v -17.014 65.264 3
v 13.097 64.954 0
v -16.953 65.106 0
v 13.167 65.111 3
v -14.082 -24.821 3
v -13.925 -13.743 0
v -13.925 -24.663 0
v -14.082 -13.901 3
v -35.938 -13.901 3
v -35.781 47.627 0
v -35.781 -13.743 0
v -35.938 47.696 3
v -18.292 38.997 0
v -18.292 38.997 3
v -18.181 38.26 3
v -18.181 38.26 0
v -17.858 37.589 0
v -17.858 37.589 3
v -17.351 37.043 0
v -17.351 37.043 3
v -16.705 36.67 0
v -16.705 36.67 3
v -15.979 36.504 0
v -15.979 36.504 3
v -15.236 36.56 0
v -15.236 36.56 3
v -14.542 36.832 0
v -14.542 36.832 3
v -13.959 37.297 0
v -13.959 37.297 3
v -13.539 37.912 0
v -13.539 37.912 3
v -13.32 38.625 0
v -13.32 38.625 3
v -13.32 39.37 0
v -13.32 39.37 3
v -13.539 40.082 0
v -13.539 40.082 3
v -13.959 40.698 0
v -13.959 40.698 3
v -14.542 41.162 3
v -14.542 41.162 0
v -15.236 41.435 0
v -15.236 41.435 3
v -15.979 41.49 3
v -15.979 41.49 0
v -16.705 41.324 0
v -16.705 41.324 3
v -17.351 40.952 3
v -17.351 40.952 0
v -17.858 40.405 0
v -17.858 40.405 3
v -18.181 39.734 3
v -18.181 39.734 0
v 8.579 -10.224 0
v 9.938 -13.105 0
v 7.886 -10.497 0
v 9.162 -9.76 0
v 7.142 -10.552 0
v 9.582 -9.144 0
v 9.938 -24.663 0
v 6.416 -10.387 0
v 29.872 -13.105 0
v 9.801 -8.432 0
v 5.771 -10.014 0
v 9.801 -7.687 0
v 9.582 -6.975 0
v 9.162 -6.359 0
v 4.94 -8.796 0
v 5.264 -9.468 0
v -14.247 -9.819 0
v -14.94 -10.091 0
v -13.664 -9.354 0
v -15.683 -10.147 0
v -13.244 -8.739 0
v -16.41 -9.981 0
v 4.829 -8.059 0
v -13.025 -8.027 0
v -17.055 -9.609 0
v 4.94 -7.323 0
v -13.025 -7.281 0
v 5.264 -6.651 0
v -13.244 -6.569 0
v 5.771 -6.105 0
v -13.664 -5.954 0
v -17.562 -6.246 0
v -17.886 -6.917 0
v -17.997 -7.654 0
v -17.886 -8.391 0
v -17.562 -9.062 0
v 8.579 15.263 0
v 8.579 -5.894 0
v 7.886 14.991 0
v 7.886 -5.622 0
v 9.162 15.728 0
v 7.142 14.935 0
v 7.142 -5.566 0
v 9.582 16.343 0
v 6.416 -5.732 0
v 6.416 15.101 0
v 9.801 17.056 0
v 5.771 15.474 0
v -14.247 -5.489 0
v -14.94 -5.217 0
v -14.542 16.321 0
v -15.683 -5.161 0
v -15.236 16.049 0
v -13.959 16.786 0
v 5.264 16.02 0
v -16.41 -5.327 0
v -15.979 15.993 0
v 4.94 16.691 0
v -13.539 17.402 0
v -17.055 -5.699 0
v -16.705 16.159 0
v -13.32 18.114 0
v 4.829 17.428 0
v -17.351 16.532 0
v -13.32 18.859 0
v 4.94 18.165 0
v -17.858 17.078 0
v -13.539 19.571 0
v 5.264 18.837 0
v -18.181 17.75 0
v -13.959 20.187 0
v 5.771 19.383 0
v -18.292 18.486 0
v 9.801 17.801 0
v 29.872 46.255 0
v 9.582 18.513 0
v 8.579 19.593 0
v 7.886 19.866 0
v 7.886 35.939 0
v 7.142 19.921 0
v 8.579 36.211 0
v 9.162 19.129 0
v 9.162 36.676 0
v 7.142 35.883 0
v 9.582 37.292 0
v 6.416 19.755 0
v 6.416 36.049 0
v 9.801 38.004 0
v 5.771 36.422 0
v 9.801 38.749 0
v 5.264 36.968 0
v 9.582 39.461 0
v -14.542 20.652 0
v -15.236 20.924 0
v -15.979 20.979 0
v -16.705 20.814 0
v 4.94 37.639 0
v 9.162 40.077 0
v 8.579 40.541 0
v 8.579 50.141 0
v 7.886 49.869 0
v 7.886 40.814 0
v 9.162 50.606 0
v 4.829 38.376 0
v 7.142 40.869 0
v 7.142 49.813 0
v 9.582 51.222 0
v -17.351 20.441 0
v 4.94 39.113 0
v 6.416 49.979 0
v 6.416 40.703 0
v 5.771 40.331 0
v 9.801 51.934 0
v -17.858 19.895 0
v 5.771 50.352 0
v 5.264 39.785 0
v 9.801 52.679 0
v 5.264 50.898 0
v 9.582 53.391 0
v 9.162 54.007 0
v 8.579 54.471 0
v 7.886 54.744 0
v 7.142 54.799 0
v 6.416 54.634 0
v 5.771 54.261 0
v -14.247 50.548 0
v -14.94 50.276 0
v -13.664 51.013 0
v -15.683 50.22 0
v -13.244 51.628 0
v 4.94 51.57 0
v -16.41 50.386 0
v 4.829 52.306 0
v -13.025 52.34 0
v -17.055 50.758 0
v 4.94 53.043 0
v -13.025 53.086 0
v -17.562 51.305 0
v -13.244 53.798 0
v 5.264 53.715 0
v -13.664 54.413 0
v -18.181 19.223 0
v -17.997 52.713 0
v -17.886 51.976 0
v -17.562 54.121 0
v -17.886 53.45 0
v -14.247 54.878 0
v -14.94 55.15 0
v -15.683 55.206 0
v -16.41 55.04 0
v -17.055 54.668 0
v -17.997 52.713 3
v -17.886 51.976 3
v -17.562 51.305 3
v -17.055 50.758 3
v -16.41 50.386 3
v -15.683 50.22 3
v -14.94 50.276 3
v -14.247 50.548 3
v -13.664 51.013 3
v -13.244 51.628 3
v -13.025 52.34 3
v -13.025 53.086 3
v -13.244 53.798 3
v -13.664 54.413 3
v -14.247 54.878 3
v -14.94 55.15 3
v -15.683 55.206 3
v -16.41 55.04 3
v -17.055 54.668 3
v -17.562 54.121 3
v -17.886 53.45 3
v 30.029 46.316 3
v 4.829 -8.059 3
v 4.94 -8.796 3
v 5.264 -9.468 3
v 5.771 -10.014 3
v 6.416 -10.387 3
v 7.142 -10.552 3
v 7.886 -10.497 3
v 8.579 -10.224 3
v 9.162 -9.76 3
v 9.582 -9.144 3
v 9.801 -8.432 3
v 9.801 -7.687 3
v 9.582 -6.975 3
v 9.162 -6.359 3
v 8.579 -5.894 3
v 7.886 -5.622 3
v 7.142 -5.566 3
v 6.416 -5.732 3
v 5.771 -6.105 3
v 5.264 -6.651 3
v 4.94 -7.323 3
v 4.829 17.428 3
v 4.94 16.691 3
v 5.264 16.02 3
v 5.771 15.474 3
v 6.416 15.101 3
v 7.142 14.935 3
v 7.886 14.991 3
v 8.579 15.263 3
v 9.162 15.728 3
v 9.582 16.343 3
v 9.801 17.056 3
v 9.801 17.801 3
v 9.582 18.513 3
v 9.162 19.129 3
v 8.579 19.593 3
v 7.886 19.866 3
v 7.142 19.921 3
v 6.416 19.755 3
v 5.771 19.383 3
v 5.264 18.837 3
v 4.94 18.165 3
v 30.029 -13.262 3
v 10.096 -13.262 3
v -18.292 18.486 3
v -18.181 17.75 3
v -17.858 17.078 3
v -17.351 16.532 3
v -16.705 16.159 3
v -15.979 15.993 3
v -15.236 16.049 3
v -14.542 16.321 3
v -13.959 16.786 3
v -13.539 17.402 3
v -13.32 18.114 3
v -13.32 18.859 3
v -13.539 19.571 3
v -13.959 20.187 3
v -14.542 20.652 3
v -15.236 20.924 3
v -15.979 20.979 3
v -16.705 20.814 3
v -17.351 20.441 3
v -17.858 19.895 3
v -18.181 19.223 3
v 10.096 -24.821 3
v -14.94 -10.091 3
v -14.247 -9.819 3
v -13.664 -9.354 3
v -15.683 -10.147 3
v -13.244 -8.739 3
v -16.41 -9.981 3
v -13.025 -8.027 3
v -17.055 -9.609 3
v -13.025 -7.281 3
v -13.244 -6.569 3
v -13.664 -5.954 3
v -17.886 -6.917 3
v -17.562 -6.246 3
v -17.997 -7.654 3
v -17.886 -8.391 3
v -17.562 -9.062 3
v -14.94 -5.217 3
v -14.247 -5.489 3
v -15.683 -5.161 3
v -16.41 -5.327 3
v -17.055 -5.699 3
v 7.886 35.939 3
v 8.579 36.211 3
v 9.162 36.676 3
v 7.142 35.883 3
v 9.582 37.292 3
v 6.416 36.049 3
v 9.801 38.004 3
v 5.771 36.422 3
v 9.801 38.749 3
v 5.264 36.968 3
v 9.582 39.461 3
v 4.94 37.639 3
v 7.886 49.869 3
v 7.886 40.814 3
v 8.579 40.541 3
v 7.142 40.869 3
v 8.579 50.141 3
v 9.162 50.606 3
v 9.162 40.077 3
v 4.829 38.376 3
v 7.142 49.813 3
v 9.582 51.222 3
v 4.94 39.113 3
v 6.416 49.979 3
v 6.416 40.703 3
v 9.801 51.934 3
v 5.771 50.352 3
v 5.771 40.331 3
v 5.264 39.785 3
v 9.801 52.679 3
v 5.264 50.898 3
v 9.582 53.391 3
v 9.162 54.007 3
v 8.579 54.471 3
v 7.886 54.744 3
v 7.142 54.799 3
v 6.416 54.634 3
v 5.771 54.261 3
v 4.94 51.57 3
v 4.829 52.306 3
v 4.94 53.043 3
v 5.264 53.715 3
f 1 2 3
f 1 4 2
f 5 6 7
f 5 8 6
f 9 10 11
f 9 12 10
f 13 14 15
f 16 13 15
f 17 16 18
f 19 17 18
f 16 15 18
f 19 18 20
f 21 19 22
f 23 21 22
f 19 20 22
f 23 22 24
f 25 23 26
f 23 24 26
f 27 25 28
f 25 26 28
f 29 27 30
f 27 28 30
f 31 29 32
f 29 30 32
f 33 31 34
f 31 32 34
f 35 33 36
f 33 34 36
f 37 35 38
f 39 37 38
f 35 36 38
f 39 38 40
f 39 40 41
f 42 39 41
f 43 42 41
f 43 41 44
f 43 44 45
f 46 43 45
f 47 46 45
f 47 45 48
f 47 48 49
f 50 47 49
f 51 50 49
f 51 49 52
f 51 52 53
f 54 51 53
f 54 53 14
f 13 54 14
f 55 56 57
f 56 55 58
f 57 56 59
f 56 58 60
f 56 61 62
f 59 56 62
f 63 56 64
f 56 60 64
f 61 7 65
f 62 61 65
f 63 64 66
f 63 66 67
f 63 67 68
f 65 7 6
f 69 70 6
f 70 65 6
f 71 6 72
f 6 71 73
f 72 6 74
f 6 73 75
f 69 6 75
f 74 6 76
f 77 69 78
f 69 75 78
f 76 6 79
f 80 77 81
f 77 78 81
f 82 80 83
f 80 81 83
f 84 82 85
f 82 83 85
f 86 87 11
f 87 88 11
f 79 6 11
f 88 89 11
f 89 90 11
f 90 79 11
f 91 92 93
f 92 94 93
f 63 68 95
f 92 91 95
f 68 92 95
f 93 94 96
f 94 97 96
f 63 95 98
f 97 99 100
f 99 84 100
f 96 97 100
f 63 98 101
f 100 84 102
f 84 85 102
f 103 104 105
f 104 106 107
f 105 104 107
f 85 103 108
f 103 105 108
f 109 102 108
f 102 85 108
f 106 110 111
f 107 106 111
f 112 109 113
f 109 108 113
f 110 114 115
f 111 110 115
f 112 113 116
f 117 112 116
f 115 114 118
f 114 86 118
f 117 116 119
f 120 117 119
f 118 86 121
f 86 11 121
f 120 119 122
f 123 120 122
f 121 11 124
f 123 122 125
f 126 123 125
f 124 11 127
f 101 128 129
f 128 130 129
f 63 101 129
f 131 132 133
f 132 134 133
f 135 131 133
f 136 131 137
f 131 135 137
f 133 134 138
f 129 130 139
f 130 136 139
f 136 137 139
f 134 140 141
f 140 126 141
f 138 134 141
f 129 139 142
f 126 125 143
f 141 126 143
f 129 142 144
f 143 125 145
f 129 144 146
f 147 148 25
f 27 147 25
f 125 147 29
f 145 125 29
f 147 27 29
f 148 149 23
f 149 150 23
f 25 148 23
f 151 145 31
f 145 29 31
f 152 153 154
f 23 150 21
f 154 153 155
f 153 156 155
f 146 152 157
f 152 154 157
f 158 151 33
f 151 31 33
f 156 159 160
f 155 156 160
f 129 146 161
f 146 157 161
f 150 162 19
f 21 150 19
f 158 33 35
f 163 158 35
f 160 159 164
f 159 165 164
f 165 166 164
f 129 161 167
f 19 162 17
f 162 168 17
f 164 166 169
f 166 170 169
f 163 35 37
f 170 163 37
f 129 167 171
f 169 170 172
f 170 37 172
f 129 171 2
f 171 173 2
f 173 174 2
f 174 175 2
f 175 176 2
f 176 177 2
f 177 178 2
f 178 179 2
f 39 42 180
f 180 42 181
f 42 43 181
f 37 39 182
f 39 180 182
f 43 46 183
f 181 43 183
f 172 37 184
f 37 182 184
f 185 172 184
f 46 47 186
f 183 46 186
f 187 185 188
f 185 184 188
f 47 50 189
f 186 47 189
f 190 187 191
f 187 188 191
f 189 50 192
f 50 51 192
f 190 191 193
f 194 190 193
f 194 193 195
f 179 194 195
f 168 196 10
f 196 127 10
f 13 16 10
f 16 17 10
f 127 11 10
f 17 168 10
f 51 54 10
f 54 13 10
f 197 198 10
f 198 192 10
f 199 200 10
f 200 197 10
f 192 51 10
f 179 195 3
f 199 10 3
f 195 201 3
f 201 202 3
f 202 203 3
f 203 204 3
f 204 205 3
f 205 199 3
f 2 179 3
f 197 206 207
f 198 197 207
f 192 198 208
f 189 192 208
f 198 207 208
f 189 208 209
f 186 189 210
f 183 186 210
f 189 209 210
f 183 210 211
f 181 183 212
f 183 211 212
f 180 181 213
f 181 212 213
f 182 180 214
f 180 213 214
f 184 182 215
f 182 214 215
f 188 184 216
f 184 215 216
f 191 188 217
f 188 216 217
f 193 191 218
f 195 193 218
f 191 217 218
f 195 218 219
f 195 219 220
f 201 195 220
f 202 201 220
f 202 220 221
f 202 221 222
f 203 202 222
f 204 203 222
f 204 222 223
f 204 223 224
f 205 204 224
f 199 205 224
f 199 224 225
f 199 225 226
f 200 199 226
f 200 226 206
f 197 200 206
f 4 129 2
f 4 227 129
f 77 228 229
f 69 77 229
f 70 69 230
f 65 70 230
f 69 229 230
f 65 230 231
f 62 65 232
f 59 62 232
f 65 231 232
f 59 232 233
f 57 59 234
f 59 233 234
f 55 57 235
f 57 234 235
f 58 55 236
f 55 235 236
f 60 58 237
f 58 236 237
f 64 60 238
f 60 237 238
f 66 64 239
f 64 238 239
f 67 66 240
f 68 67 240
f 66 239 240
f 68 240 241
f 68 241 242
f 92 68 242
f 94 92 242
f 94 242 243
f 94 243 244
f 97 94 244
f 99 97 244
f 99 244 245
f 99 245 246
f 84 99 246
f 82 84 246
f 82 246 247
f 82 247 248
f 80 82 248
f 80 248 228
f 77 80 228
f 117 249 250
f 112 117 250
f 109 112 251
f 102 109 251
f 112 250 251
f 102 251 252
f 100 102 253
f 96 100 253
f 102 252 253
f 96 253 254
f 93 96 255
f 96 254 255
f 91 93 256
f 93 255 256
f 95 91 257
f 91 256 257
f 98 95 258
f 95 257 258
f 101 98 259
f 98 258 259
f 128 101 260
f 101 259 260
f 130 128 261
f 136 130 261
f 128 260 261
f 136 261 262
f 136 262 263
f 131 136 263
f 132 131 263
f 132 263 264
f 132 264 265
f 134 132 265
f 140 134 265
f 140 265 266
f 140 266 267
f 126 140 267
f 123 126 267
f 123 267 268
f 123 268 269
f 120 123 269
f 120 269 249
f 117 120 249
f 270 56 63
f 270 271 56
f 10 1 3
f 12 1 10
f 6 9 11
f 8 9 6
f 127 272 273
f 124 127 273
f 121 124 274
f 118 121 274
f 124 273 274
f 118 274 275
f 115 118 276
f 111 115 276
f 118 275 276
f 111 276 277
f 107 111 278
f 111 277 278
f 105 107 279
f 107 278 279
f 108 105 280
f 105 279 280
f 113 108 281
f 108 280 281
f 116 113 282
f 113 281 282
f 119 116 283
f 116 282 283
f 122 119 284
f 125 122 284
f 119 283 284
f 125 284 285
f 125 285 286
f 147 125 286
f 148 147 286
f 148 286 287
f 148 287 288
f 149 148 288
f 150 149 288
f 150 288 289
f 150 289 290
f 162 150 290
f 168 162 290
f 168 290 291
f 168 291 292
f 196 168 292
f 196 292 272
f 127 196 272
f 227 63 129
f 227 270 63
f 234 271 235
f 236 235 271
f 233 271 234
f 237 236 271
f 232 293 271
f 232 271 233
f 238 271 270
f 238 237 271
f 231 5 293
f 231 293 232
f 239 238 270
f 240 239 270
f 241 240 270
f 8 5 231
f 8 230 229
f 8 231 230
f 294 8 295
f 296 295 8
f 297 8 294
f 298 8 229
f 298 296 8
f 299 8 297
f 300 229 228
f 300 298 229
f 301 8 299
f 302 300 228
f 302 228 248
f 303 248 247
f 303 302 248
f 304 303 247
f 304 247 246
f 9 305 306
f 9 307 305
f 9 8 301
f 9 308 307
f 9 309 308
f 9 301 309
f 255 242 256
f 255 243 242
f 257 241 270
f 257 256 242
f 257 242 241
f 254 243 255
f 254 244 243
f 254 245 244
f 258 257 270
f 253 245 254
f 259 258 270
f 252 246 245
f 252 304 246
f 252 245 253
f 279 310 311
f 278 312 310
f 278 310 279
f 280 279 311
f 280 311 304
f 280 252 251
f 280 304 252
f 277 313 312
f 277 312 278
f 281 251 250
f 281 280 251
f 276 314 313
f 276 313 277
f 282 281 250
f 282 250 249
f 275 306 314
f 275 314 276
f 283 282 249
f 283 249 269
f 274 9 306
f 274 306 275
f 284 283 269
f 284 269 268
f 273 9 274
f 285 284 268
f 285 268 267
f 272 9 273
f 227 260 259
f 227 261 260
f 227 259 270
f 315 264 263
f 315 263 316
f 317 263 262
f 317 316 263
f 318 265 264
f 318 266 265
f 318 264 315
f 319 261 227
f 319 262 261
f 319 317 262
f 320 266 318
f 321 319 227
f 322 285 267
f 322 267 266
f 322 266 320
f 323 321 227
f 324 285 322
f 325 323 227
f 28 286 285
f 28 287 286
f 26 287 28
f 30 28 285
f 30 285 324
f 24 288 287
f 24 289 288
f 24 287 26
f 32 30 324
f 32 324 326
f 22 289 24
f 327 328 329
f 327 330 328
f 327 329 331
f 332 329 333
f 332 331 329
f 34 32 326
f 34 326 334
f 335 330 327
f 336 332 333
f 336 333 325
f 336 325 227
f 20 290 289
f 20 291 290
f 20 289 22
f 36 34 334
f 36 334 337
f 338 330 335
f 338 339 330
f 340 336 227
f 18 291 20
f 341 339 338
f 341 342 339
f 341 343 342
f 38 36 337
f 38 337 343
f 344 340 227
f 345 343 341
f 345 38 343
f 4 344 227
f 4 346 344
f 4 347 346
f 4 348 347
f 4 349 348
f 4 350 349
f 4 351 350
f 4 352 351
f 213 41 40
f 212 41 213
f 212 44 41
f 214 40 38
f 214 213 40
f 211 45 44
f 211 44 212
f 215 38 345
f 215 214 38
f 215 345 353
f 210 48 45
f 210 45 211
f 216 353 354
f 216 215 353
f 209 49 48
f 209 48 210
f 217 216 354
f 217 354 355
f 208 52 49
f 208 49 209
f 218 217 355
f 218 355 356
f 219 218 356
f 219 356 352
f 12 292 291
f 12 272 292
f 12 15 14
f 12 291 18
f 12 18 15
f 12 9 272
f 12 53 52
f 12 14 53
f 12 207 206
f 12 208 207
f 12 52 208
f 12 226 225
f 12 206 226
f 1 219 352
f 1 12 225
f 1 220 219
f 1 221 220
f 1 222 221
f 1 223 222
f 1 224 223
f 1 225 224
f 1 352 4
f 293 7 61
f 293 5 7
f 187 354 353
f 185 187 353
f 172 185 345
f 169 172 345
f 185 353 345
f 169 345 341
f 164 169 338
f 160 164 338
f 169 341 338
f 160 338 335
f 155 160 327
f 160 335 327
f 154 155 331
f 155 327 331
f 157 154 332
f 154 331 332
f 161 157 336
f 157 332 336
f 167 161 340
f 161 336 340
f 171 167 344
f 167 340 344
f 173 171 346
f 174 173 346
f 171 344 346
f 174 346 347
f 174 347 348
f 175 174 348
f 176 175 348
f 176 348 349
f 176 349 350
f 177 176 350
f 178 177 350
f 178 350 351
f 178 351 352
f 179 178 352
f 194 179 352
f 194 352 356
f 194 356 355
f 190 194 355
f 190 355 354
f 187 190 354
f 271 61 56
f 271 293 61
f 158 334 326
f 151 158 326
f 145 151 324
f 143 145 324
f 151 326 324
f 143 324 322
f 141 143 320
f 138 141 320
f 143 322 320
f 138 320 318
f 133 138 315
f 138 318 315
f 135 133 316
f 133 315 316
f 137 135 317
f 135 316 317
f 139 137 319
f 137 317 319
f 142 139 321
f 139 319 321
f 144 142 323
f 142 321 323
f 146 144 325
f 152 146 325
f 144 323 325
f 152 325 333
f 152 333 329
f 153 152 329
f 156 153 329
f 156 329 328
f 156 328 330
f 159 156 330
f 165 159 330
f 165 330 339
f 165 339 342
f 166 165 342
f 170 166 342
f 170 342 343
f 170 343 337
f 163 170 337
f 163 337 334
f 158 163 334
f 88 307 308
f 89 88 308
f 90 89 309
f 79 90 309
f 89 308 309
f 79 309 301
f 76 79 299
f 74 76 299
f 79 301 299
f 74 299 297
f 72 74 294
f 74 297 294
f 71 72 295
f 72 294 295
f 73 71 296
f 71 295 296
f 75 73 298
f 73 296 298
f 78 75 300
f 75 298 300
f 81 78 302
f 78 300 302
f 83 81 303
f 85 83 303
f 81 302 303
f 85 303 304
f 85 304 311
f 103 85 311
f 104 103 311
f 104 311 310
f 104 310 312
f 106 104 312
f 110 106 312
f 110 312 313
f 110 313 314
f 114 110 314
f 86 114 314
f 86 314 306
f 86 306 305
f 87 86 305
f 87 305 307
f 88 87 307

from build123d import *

# Parameters (mm, degrees)
F2_DEPTH   = 3
F2_TAPER   = -3
F6_D       = 5
F6_ON_F4_D = 5


# Not quite as in the source:
# - the program builds the solid bodies; features that only make, move or delete a surface that nothing else refers to are left out


with BuildPart() as f2:
    # F0 (on Top) → F2 (new body)
    with BuildSketch(Plane.XY):
        Polygon((-13.9245763421, -24.6634986252), (9.9384738132, -24.6634986252), (9.9384738132, -13.1047982723), (29.8719406128, -13.1047982723), (29.8719406128, 46.2553314865), (13.0966929719, 64.9538859725), (-16.9530268759, 65.1064962149), (-35.7809066772, 47.6274192333), (-35.7809066772, -13.7434657663), (-13.9245763421, -13.7434657663), align=None)
    extrude(amount=F2_DEPTH, taper=F2_TAPER)

    # F6 (through all)
    with Locations(Plane(origin=(0, 0, 0), x_dir=(1, 0, 0), z_dir=(0, 0, -1))):
        with Locations((-15.4966376722, -52.7129508555), (7.3292911984, -52.3064211011), (7.3292911984, -38.3762717247), (7.3292911984, -17.4282062799), (-15.4966376722, 7.6540475711), (7.3292911984, 8.0594113097)):
            Hole(F6_D / 2)

    # F6 on F4 (through all)
    with Locations(Plane(origin=(0, 0, 0), x_dir=(1, 0, 0), z_dir=(0, 0, -1))):
        with Locations((-15.7919153571, -38.9971844852), (-15.7919153571, -18.486443907)):
            Hole(F6_ON_F4_D / 2)


solid = f2.part
